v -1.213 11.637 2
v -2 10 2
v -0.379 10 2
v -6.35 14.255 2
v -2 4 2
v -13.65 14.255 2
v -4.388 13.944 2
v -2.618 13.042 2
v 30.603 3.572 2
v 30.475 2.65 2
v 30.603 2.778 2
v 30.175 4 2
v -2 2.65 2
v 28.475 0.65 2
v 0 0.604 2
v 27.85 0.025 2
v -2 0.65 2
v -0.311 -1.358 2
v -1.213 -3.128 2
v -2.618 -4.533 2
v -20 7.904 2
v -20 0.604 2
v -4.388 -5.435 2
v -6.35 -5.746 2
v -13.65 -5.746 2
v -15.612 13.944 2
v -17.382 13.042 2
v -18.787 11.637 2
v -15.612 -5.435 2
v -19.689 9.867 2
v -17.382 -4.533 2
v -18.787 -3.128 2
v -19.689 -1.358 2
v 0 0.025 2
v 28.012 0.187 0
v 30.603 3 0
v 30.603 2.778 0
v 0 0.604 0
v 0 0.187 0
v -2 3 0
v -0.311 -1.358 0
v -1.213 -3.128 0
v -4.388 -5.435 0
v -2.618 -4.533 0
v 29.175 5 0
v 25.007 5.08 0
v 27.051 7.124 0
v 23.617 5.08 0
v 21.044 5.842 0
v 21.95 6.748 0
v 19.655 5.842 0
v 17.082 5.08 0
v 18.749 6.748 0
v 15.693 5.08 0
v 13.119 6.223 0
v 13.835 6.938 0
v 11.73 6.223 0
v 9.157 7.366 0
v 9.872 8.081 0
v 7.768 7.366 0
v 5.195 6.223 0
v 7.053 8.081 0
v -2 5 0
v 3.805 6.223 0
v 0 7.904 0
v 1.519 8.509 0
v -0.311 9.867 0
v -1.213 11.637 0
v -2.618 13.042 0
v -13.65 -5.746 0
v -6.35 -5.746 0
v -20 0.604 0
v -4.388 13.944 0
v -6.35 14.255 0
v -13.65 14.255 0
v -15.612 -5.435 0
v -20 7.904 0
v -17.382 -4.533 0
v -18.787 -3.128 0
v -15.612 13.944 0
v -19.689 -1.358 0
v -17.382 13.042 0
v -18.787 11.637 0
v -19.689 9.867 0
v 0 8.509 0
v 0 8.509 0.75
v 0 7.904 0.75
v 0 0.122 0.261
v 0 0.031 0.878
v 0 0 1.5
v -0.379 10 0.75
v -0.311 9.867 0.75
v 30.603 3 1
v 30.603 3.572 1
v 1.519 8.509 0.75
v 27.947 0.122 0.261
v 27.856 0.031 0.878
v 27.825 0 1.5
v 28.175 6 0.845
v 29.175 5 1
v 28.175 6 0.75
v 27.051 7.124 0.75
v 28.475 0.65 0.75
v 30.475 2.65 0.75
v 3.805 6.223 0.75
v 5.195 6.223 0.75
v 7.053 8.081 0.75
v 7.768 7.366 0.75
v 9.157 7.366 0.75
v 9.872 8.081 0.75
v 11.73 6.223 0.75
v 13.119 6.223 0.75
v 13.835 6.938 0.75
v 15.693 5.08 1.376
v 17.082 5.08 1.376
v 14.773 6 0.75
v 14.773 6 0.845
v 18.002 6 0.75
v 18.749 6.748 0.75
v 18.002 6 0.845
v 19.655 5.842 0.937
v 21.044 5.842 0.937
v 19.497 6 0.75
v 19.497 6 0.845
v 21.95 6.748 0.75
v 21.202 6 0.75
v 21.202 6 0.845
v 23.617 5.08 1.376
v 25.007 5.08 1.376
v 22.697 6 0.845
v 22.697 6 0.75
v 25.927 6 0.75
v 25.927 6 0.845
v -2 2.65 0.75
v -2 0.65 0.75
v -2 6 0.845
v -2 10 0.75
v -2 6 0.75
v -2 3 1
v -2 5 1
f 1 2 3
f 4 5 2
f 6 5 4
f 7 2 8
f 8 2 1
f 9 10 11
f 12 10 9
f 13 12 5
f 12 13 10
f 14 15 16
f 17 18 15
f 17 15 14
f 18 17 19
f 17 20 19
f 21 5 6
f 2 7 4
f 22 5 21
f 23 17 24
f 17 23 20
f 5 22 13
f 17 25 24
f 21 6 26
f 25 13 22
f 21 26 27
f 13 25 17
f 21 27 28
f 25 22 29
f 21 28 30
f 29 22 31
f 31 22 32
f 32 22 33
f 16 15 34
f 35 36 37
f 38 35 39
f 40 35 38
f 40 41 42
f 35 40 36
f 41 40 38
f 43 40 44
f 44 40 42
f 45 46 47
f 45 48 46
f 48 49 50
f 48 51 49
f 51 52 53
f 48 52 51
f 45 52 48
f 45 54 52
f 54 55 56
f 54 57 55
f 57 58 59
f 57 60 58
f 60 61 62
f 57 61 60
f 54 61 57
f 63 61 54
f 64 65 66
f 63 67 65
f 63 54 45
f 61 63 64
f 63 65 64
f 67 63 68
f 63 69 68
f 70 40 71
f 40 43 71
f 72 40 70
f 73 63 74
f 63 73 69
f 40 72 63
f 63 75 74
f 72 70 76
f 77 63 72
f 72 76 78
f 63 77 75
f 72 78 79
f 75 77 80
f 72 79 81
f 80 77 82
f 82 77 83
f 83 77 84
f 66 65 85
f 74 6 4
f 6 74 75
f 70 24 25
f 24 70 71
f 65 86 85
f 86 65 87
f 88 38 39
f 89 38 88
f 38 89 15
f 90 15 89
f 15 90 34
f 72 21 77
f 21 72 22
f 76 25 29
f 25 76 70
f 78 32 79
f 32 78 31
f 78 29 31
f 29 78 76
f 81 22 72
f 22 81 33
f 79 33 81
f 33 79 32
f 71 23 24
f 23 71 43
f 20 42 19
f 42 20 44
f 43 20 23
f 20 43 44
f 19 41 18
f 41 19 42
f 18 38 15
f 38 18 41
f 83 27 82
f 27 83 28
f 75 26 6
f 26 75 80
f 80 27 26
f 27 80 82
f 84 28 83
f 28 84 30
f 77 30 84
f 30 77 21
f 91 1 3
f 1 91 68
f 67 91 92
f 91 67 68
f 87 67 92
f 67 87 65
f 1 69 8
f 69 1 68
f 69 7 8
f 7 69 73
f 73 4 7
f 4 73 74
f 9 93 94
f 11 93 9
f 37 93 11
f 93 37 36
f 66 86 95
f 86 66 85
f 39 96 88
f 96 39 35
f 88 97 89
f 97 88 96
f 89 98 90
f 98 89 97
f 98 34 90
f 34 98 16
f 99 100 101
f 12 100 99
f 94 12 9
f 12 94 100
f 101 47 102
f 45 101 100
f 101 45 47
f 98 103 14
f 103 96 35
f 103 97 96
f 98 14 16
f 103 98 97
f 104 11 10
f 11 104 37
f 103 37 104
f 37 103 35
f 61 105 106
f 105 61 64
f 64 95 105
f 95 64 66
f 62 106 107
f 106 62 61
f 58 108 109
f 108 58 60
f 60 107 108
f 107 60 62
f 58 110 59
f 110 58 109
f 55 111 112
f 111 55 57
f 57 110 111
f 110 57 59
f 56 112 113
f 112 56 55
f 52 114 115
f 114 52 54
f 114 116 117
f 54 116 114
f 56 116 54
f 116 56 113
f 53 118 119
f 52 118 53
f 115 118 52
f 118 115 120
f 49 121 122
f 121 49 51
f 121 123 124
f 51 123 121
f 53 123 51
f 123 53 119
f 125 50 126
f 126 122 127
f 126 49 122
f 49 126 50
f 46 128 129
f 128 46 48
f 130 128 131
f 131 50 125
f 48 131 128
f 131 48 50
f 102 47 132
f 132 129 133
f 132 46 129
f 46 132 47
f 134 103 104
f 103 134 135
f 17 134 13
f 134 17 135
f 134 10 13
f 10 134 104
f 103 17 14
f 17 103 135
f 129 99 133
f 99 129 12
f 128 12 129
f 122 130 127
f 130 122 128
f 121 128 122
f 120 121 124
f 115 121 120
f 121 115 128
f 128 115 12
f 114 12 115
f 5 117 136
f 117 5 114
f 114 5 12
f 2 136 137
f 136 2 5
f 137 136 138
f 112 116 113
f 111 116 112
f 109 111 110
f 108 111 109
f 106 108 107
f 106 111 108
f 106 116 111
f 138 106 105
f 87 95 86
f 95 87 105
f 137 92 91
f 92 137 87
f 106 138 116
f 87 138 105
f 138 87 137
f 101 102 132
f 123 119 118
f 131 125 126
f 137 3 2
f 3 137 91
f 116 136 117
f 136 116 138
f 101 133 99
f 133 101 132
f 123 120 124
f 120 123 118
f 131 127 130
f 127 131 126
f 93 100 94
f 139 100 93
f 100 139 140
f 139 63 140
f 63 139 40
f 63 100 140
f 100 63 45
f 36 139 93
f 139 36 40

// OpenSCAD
//Pin reference Table
//0 = .300"
//1 = .285
//2 = .270
//3 = .255"
//4 = .240"
//5 = .225"
//6 = .210"
//7 = .195"
//8 = .180"
//9 = .165" 
//10 = .150"
//test lock is a 47413
//cuts are ordered the same as key codes
//(cut at the handle of key)
cut_1 = 6; //[0:10]
cut_2 = 3; //[0:10]
cut_3 = 6; //[0:10]
cut_4 = 9; //[0:10]
cut_5 = 7; //[0:10]
cut_6 = 9; //[0:10]
//(cut at the tip of key)


function mm(i) = i*25.4;

module handle(size, r) {
  union() {
    translate([r, 0, 0]) cube([size[0]-2*r, size[1], size[2]]);
    translate([0, r, 0]) cube([size[0], size[1]-2*r, size[2]]);
    translate([r, r, 0]) cylinder(h=size[2], r=r);
    translate([size[0]-r, r, 0]) cylinder(h=size[2], r=r);
    translate([r, size[1]-r, 0]) cylinder(h=size[2], r=r);
    translate([size[0]-r, size[1]-r, 0]) cylinder(h=size[2], r=r);
  }
}

module bit() {
  w = mm(1/4);
  difference() {
    translate([-w/2, 0, 0]) cube([w, mm(1), w]);
    translate([-mm(7/256), 0, 0]) rotate([0, 0, 135]) cube([w, w, w]);
    translate([mm(7/256), 0, 0]) rotate([0, 0, -45]) cube([w, w, w]);
  }
}

// Schlage SC1 5 pin key.  The measurements are mostly guesses based on reverse
// engineering some keys I have and some publicly available information.
module sc1(bits) {
  // You may need to adjust these to fit your specific printer settings
  thickness = 2;
  length = 31;
  width = mm(.335);
  
  shoulder = 4.5;
  pin_spacing = mm(.156);
  depth_inc = mm(.015);
  
  // A fudge factor.  Printing with your average RepRap, the bottom layer is
  // going to be squeezed larger than you want. You can make the pins
  // go slighly deeper by a fudge amount to make up for it if you aren't
  // adjusting for it elsewhere like Skeinforge or in your firmware.
  // 0.5mm works well for me.
  fudge = 0;
  

  
  // Handle size
  h_l = 20;
  h_w = 20;
  difference() {
    // blade and key handle
    union() {
      translate([-h_l, -h_w/2 + width/2, 0]) handle([h_l, h_w, thickness], mm(1/4));
      intersection() {
        // cut a little off the tip to avoid going too long
        cube([length - mm(1/64), width, thickness]);
        translate([0, mm(1/4), thickness*3/4]) rotate([0, 90, 0]) cylinder(h=length, r=mm(1/4), $fn=64);
      }
    }
    
    // chamfer the tip
    translate([length, mm(1/8), 0]) {
      rotate([0, 0, 45]) cube([10, 10, thickness]);
      rotate([0, 0, 225]) cube([10, 10, thickness]);
    }


    // cut the channels in the key.  designed more for printability than accuracy
    //Side A 
    translate([-thickness, 0.65, 0.75]) cube([length + thickness, 2, thickness-0.75]);  
    translate([-thickness, 4, thickness])rotate([-30,0,0]) cube([length + thickness, 2.5, thickness-0.75]);
    translate([-thickness, 6, 0.75]) cube([length + thickness, 4, thickness-0.75]);
    
    //Side B
    translate([-thickness, 3, 0]) cube([length + thickness, 2, 1]);  
    
    // Do the actual bitting
    for (b = [0:5]) {
      translate([shoulder + b*pin_spacing, width - bits[b]*depth_inc, 0]) bit();
    }
  }
}

sc1([cut_1,cut_2,cut_3,cut_4,cut_5,cut_6]);
